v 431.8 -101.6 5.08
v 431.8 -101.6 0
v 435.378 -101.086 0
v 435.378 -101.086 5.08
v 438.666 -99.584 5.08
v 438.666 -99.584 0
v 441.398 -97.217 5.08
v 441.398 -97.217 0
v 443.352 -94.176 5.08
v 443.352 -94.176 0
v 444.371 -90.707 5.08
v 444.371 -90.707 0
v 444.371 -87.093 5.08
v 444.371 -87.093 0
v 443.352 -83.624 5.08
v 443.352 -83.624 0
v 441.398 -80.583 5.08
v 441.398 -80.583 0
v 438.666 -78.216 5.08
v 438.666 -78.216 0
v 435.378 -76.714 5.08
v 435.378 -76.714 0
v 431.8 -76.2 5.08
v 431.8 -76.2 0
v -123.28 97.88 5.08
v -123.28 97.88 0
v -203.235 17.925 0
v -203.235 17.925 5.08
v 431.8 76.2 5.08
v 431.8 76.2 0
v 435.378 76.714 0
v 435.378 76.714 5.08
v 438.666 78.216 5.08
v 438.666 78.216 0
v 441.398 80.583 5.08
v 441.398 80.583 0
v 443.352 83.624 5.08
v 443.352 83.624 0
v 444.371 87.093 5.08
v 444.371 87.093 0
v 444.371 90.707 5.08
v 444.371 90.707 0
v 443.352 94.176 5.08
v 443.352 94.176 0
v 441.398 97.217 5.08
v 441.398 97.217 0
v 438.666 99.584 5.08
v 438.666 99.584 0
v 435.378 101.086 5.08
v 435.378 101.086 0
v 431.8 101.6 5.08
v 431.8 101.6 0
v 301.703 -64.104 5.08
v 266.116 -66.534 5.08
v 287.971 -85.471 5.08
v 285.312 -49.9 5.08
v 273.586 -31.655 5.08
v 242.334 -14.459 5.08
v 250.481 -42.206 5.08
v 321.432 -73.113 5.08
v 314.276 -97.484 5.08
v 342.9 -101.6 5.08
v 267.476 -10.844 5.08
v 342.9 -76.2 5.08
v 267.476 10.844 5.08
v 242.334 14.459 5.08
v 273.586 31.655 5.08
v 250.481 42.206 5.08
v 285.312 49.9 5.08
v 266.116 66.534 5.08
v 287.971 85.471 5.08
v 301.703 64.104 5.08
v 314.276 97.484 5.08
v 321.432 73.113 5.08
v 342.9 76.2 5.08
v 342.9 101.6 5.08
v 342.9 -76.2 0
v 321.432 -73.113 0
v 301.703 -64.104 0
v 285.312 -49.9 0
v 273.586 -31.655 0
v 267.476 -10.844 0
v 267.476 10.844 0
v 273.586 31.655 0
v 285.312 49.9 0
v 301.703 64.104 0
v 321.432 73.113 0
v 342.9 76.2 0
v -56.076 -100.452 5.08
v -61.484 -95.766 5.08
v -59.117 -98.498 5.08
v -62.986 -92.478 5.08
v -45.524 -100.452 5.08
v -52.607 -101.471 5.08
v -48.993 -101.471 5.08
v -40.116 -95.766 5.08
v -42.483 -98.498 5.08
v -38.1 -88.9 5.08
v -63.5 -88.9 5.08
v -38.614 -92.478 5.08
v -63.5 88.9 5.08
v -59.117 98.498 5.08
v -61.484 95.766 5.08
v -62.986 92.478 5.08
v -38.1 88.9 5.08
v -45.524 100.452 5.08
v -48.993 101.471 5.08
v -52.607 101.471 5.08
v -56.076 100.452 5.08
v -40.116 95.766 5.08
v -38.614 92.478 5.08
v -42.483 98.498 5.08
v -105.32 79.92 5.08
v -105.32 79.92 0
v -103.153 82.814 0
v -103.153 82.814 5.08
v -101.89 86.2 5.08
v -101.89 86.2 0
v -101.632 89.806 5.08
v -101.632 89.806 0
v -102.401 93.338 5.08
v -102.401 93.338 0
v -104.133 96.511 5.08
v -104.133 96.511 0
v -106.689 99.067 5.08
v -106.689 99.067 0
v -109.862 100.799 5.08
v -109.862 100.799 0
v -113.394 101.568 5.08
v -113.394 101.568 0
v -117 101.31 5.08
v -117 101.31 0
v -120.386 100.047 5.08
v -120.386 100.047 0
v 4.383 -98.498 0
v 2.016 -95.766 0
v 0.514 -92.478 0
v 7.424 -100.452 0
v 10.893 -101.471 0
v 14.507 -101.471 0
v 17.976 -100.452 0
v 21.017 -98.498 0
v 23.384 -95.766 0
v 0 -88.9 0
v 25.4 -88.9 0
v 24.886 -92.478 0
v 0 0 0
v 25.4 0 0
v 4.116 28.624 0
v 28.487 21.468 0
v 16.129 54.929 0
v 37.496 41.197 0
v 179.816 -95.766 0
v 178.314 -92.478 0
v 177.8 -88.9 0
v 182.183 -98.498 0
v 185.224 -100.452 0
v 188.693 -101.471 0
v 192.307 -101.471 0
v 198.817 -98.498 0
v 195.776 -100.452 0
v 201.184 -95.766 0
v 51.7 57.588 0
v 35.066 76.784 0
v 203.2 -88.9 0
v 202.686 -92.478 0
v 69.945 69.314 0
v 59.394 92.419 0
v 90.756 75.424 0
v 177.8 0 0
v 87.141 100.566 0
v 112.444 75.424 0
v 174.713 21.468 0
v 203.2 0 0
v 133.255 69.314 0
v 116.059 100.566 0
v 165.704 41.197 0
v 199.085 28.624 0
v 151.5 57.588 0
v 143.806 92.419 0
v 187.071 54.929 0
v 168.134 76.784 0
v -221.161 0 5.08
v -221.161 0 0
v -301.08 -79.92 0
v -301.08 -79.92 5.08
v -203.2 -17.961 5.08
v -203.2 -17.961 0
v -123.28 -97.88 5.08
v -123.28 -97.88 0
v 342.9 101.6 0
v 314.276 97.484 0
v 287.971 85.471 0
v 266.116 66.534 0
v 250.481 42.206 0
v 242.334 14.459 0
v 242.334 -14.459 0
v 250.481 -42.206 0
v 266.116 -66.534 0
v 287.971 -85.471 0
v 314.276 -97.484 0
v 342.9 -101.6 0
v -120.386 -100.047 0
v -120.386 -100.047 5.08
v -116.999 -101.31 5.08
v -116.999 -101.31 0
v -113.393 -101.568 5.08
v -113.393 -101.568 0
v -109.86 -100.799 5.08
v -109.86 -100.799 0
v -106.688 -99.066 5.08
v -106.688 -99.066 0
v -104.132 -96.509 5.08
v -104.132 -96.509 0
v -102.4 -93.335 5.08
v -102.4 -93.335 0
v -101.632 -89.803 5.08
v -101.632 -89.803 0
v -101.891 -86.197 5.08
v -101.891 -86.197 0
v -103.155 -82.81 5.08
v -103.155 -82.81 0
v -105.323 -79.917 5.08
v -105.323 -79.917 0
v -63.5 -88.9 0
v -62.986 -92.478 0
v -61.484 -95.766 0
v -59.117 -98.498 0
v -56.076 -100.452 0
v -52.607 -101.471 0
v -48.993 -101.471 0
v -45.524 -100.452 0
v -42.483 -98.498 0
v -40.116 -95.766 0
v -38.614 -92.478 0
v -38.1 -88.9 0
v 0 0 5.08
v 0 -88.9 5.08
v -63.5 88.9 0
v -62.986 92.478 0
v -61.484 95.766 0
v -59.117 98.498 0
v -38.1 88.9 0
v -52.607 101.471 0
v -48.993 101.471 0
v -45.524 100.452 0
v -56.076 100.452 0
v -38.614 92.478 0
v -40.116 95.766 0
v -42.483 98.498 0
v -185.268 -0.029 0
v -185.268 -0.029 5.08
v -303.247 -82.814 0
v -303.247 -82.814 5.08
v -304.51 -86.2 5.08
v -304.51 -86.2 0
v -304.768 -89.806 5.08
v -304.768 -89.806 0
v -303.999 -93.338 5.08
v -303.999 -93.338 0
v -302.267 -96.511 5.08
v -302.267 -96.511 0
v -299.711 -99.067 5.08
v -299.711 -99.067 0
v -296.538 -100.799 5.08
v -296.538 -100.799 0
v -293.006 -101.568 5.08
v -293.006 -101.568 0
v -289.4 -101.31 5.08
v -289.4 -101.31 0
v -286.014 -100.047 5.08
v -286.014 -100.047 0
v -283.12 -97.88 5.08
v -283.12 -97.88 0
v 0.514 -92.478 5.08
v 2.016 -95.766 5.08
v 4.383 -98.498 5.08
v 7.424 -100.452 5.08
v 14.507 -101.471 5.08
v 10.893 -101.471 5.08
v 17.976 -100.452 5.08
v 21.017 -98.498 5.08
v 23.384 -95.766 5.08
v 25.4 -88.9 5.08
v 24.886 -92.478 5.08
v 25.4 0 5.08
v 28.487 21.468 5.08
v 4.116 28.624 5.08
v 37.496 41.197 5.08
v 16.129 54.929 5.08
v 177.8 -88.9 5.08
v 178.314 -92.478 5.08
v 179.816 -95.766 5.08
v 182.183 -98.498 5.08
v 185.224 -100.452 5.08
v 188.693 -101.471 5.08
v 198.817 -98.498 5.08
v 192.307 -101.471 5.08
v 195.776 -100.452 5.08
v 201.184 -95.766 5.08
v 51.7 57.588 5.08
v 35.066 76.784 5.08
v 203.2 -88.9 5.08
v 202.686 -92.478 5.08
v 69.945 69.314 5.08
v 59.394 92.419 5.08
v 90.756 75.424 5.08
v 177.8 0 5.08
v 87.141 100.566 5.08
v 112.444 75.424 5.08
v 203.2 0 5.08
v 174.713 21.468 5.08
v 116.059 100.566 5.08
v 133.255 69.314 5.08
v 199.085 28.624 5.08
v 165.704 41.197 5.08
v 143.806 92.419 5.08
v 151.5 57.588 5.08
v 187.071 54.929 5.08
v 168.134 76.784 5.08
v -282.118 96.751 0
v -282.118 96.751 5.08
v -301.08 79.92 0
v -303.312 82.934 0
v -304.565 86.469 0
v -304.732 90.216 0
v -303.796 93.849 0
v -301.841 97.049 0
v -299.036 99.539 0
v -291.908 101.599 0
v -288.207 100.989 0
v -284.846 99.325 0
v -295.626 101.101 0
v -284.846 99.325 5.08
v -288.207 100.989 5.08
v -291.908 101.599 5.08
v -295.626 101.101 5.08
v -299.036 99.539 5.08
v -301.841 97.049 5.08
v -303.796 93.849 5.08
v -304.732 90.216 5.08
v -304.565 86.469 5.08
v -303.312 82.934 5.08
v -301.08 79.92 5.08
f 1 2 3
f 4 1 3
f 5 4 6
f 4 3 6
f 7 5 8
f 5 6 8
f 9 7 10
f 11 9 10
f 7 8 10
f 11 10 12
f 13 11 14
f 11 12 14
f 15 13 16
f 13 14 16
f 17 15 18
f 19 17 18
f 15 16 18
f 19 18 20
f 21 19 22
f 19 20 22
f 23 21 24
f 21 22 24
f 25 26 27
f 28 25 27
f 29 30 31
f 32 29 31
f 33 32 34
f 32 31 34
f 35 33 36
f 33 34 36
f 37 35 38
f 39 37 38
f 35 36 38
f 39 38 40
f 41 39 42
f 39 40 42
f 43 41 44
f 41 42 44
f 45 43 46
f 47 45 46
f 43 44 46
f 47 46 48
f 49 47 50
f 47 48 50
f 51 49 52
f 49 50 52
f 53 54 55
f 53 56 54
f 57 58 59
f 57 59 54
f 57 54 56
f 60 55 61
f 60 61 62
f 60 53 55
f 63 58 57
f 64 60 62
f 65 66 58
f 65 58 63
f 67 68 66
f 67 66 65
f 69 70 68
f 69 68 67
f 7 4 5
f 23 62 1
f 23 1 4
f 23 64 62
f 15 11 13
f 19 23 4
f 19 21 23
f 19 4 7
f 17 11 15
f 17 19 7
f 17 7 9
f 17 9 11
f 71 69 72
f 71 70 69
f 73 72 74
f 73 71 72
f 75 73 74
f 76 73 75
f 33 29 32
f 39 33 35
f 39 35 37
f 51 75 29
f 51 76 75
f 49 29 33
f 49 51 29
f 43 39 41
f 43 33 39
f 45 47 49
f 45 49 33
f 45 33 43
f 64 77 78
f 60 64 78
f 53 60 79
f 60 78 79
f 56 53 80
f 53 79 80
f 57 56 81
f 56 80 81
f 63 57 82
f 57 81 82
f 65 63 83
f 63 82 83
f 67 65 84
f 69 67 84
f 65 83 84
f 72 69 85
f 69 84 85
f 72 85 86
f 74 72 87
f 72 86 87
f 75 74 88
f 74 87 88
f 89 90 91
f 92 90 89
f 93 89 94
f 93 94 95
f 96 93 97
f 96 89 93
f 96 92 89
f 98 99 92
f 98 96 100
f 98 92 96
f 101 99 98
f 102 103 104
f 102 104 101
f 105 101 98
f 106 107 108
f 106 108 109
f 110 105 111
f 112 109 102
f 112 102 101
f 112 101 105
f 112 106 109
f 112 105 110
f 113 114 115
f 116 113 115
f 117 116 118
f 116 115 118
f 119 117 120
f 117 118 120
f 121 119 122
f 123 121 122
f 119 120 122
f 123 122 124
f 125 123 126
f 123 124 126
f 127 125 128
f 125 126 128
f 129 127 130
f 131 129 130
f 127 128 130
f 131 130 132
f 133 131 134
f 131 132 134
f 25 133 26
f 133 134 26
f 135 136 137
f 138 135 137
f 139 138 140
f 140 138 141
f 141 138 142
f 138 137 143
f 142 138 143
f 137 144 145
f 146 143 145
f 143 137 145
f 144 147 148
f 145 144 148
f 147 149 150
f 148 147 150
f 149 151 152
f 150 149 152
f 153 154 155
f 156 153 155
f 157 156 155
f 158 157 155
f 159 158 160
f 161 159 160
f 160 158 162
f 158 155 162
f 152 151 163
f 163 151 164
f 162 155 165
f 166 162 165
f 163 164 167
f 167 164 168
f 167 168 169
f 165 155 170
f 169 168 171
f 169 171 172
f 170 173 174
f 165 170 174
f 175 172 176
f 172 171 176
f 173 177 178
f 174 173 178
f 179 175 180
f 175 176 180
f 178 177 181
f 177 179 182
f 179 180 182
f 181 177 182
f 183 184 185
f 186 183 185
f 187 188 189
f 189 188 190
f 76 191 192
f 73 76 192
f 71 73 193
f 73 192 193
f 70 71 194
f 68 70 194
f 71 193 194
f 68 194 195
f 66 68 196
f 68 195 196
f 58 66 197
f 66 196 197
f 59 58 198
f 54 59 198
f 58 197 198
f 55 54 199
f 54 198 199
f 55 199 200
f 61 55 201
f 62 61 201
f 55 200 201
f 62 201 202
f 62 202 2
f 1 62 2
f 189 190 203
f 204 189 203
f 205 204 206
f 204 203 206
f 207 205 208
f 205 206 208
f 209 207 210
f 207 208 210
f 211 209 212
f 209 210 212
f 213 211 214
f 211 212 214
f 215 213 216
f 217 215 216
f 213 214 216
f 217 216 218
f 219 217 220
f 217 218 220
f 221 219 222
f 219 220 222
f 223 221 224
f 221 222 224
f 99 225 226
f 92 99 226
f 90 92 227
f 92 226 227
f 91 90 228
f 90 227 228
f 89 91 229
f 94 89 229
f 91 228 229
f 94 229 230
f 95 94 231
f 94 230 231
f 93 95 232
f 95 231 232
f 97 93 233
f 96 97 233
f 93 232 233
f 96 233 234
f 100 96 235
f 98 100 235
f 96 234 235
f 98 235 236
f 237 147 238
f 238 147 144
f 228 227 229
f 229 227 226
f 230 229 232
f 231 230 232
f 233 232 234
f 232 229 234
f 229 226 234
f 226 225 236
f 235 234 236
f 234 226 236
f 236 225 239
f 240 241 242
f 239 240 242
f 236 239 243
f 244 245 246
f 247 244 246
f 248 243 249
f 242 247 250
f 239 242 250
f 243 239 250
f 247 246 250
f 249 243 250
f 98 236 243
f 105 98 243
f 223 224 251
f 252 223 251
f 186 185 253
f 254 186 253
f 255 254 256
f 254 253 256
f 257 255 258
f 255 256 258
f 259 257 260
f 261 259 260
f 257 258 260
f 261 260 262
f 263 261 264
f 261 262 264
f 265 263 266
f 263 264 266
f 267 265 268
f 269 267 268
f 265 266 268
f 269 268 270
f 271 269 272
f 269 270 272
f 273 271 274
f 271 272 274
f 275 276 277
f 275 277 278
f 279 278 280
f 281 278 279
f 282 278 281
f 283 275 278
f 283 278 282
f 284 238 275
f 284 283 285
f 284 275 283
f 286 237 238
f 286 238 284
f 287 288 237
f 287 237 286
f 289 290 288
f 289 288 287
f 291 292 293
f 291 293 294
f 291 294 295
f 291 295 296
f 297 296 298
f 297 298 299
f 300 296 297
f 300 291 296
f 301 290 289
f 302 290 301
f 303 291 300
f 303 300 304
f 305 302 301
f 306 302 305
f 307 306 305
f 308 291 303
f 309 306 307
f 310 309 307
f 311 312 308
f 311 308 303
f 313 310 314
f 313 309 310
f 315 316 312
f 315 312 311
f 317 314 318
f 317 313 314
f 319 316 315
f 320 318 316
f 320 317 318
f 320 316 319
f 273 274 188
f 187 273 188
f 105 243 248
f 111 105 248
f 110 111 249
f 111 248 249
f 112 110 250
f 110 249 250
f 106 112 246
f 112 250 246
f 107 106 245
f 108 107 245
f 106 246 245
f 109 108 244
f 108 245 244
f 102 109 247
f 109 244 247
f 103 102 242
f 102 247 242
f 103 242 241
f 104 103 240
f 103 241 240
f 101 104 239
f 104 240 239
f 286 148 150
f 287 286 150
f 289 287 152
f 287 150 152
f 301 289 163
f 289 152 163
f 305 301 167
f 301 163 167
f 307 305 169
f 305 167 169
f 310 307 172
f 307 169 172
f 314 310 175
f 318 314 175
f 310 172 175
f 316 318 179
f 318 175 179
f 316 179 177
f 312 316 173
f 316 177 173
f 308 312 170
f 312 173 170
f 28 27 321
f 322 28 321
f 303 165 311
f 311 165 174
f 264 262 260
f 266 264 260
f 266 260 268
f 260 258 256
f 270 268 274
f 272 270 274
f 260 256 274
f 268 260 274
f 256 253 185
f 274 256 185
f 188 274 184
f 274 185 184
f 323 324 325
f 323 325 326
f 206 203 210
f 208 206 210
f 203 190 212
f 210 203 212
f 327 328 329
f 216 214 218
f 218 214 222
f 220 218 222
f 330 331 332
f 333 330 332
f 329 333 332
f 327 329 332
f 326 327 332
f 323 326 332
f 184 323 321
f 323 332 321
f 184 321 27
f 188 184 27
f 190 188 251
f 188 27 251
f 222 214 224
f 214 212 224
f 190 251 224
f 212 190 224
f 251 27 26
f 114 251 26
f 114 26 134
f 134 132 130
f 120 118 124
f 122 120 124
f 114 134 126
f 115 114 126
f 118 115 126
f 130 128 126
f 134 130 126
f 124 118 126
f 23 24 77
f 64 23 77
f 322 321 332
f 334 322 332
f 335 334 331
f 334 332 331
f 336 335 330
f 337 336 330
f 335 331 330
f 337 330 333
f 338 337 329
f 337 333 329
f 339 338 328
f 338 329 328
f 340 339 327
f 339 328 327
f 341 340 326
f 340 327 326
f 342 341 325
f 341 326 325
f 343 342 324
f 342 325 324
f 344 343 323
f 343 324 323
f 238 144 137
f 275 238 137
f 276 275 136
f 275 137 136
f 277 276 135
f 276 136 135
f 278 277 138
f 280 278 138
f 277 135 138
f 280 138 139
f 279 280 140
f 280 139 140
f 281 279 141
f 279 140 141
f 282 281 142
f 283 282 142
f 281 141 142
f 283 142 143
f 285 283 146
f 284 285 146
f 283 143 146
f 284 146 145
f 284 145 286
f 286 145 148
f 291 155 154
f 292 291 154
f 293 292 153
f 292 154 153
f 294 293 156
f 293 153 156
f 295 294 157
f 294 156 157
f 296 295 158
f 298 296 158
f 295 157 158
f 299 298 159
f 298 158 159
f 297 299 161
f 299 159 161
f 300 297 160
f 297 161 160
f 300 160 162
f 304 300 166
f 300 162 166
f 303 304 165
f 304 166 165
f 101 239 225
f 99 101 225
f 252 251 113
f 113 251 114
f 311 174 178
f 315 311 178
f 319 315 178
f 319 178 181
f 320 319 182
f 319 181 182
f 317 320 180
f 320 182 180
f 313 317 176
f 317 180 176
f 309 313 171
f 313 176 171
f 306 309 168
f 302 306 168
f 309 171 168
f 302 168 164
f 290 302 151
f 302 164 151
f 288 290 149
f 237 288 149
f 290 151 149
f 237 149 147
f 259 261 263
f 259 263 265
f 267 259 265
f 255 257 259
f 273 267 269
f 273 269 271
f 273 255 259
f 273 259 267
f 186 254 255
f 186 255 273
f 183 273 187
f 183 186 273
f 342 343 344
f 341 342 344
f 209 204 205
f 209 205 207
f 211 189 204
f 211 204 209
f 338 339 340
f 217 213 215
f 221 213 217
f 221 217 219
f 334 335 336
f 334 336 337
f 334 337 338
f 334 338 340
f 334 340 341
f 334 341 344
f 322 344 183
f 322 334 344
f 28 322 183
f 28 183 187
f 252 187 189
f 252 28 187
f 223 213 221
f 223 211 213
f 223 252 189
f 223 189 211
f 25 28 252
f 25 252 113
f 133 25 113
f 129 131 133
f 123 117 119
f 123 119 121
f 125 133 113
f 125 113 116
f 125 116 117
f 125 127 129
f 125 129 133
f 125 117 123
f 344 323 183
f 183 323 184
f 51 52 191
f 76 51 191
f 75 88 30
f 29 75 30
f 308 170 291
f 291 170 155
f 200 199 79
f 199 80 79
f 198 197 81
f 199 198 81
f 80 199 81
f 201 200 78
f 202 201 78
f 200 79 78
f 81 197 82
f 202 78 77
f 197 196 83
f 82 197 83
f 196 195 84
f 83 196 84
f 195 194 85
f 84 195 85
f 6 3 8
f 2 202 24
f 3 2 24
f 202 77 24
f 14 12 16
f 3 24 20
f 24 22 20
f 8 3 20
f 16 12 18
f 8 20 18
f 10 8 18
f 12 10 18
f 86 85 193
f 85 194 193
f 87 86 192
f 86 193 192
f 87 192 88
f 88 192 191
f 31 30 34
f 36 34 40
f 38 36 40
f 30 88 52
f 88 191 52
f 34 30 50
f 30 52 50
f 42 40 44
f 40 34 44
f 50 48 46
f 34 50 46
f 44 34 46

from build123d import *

# Parameters (mm, degrees)
F1_DEPTH = 5.08


with BuildPart() as f1:
    # F0 (on Top) → F1 (new body)
    with BuildSketch(Plane.XY):
        with BuildLine():
            Line((-203.235139, 17.925373), (-282.11758, 96.751196))
            ThreePointArc((-282.11758, 96.751196), (-300.530631, 98.39813), (-301.080256, 79.919744))
            Line((-301.080256, 79.919744), (-221.160512, 0))
            Line((-221.160512, 0), (-301.080256, -79.919744))
            ThreePointArc((-301.080256, -79.919744), (-301.080256, -97.880256), (-283.119744, -97.880256))
            Line((-283.119744, -97.880256), (-203.2, -17.960512))
            Line((-203.2, -17.960512), (-123.280256, -97.880256))
            ThreePointArc((-123.280256, -97.880256), (-105.318132, -97.878644), (-105.322968, -79.916521))
            Line((-105.322968, -79.916521), (-185.268179, -0.028691))
            Line((-185.268179, -0.028691), (-105.319744, 79.919744))
            ThreePointArc((-105.319744, 79.919744), (-105.319744, 97.880256), (-123.280256, 97.880256))
            Line((-123.280256, 97.880256), (-203.235139, 17.925373))
        make_face()
        with BuildLine():
            Line((-38.1, -88.9), (-38.1, 88.9))
            ThreePointArc((-38.1, 88.9), (-50.8, 101.6), (-63.5, 88.9))
            Line((-63.5, 88.9), (-63.5, -88.9))
            ThreePointArc((-63.5, -88.9), (-50.8, -101.6), (-38.1, -88.9))
        make_face()
        with BuildLine():
            Line((0, 0.00011), (0, -88.9))
            ThreePointArc((0, -88.9), (12.7, -101.6), (25.4, -88.9))
            Line((25.4, -88.9), (25.4, 0))
            ThreePointArc((25.4, 0), (101.6, 76.2), (177.8, 0))
            Line((177.8, 0), (177.8, -88.9))
            ThreePointArc((177.8, -88.9), (190.5, -101.6), (203.2, -88.9))
            Line((203.2, -88.9), (203.2, 0))
            ThreePointArc((203.2, 0), (101.600055, 101.600055), (0, 0.00011))
        make_face()
        with BuildLine():
            ThreePointArc((342.9, -76.2), (266.7, 0), (342.9, 76.2))
            Line((342.9, 76.2), (431.8, 76.2))
            ThreePointArc((431.8, 76.2), (444.5, 88.9), (431.8, 101.6))
            Line((431.8, 101.6), (342.9, 101.6))
            ThreePointArc((342.9, 101.6), (241.3, 0), (342.9, -101.6))
            Line((342.9, -101.6), (431.8, -101.6))
            ThreePointArc((431.8, -101.6), (444.5, -88.9), (431.8, -76.2))
            Line((431.8, -76.2), (342.9, -76.2))
        make_face()
    extrude(amount=F1_DEPTH)


solid = f1.part
